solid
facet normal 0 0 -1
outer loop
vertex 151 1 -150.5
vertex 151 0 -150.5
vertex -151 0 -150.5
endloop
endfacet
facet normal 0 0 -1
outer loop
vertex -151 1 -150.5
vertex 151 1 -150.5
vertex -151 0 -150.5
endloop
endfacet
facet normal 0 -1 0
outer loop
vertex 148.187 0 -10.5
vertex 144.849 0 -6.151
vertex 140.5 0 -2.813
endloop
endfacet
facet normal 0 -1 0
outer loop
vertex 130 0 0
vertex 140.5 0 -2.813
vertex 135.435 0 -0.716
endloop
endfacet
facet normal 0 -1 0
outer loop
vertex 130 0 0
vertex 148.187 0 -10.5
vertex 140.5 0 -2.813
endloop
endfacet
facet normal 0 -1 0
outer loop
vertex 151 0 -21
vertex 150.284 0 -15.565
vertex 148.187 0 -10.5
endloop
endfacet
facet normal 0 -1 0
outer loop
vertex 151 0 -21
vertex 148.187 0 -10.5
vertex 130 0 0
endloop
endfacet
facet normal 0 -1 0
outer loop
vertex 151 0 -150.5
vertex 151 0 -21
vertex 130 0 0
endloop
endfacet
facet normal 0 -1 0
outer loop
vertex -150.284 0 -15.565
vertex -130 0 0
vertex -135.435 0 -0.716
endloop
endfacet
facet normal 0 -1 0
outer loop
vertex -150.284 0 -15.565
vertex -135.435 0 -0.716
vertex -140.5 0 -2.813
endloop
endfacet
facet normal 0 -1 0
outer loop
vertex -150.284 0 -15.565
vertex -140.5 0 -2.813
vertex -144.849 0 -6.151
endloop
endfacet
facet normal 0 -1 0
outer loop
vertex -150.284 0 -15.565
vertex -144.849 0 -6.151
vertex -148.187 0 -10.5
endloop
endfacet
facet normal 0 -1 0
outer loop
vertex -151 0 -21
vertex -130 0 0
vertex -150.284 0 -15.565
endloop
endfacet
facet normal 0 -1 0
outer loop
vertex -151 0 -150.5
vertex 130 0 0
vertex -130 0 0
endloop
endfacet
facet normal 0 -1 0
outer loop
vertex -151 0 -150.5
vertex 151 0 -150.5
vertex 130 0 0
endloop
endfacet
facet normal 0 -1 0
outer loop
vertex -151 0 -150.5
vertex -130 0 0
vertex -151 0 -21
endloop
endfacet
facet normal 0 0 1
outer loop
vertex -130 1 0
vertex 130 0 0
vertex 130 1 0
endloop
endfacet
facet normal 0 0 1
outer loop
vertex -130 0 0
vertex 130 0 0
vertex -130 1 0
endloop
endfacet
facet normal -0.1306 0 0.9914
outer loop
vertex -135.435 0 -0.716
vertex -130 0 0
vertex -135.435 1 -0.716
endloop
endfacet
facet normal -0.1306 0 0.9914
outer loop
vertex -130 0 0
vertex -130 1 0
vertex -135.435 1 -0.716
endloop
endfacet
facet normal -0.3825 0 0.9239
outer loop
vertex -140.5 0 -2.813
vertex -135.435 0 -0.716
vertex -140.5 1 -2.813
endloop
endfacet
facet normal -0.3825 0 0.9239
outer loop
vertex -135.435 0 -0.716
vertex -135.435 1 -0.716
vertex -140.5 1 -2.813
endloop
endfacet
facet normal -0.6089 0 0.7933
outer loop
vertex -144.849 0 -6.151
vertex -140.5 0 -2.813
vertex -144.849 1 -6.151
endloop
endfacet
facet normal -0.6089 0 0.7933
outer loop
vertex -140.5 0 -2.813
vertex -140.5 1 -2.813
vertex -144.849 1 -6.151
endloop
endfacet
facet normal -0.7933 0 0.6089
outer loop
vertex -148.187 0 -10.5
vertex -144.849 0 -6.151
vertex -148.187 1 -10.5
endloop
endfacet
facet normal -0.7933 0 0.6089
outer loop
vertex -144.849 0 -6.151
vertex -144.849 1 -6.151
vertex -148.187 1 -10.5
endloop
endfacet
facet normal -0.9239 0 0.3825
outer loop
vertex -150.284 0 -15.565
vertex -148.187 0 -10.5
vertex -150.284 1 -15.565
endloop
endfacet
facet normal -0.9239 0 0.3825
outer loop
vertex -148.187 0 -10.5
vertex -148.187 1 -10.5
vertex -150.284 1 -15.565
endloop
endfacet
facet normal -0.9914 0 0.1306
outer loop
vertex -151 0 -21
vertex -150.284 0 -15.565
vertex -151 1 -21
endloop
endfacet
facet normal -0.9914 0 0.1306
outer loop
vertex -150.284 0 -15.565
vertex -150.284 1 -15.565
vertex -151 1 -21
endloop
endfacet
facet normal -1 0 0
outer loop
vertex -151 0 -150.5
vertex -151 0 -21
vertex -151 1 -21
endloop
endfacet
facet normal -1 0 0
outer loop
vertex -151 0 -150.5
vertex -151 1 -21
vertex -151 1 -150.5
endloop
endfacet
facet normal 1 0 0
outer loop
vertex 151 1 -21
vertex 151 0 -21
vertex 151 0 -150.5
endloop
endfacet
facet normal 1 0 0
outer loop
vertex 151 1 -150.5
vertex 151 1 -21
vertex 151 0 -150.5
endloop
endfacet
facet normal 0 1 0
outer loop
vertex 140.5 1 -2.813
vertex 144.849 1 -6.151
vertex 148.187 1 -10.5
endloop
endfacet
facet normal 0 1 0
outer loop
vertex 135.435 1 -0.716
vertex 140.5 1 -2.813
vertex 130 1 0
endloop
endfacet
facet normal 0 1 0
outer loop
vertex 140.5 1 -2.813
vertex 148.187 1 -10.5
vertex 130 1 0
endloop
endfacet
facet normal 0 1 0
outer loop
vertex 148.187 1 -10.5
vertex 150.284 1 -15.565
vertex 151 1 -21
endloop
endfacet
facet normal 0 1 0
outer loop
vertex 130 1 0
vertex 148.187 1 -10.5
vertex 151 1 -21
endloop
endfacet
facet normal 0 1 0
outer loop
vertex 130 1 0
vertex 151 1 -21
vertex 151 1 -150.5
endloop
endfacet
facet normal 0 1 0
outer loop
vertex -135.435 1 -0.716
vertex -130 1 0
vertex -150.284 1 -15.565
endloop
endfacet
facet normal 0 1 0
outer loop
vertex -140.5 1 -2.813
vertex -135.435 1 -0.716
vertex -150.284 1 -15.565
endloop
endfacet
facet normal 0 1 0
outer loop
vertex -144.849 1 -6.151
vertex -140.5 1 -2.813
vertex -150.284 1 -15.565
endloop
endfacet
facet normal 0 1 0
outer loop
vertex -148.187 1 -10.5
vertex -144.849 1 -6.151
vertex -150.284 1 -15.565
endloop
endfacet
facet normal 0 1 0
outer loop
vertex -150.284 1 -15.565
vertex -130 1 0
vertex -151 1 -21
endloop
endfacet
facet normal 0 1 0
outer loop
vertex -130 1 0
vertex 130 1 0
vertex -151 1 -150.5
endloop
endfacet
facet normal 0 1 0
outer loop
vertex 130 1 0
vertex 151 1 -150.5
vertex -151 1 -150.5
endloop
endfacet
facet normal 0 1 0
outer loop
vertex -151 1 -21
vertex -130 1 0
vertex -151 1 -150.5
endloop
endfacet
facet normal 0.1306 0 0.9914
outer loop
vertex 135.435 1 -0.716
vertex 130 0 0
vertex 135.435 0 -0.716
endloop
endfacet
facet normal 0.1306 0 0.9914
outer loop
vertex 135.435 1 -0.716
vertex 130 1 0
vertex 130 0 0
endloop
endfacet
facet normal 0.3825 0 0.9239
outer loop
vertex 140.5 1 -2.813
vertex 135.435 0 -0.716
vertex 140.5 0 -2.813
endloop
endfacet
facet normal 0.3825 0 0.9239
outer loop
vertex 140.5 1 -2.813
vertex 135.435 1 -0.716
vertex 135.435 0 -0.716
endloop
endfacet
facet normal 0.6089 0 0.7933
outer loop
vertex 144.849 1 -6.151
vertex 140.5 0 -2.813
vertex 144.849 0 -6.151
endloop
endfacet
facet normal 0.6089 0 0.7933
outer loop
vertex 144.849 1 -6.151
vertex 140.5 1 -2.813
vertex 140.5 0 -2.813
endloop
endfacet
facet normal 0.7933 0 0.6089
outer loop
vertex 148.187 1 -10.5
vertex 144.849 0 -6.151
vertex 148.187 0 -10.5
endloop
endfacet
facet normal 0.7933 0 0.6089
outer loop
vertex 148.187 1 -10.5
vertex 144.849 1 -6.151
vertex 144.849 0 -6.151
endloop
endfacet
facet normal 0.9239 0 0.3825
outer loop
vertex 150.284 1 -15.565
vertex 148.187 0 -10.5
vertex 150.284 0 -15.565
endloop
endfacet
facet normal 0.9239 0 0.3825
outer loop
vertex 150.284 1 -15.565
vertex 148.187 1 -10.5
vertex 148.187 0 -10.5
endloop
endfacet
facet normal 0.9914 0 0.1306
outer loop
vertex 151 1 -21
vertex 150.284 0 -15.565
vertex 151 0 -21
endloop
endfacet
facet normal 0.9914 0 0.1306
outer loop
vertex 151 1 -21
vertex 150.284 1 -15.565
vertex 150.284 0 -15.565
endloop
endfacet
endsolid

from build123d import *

# Parameters (mm, degrees)
SKIZZE1_W                  = 151
SKIZZE1_H                  = 150.5
LINEAR_AUSTRAGEN1_DEPTH    = 1
VERRUNDUNG1_R              = 21
VERRUNDUNG1_OF_SPIEGELN1_R = 21


with BuildPart() as part:
    # Skizze1 → Linear austragen1 (new body)
    with BuildSketch(Plane(origin=(0, 0, 0), x_dir=(1, 0, 0), z_dir=(0, 1, 0))):
        with Locations((75.5, 75.25)):
            Rectangle(SKIZZE1_W, SKIZZE1_H)
    linear_austragen1 = extrude(amount=LINEAR_AUSTRAGEN1_DEPTH)

    # Verrundung1
    verrundung1_edges = [part.edges().sort_by_distance(p)[0] for p in [
        (151, 0.5, 0),
    ]]
    fillet(verrundung1_edges, radius=VERRUNDUNG1_R)

    # Spiegeln1: Linear austragen1 across plane
    add(linear_austragen1.mirror(Plane(origin=(0, 1, 0), x_dir=(0, 0, 1), z_dir=(1, 0, 0))))

    # Verrundung1 of Spiegeln1
    verrundung1_of_spiegeln1_edges = [part.edges().sort_by_distance(p)[0] for p in [
        (-151, 0.5, 0),
    ]]
    fillet(verrundung1_of_spiegeln1_edges, radius=VERRUNDUNG1_OF_SPIEGELN1_R)


solid = part.part
